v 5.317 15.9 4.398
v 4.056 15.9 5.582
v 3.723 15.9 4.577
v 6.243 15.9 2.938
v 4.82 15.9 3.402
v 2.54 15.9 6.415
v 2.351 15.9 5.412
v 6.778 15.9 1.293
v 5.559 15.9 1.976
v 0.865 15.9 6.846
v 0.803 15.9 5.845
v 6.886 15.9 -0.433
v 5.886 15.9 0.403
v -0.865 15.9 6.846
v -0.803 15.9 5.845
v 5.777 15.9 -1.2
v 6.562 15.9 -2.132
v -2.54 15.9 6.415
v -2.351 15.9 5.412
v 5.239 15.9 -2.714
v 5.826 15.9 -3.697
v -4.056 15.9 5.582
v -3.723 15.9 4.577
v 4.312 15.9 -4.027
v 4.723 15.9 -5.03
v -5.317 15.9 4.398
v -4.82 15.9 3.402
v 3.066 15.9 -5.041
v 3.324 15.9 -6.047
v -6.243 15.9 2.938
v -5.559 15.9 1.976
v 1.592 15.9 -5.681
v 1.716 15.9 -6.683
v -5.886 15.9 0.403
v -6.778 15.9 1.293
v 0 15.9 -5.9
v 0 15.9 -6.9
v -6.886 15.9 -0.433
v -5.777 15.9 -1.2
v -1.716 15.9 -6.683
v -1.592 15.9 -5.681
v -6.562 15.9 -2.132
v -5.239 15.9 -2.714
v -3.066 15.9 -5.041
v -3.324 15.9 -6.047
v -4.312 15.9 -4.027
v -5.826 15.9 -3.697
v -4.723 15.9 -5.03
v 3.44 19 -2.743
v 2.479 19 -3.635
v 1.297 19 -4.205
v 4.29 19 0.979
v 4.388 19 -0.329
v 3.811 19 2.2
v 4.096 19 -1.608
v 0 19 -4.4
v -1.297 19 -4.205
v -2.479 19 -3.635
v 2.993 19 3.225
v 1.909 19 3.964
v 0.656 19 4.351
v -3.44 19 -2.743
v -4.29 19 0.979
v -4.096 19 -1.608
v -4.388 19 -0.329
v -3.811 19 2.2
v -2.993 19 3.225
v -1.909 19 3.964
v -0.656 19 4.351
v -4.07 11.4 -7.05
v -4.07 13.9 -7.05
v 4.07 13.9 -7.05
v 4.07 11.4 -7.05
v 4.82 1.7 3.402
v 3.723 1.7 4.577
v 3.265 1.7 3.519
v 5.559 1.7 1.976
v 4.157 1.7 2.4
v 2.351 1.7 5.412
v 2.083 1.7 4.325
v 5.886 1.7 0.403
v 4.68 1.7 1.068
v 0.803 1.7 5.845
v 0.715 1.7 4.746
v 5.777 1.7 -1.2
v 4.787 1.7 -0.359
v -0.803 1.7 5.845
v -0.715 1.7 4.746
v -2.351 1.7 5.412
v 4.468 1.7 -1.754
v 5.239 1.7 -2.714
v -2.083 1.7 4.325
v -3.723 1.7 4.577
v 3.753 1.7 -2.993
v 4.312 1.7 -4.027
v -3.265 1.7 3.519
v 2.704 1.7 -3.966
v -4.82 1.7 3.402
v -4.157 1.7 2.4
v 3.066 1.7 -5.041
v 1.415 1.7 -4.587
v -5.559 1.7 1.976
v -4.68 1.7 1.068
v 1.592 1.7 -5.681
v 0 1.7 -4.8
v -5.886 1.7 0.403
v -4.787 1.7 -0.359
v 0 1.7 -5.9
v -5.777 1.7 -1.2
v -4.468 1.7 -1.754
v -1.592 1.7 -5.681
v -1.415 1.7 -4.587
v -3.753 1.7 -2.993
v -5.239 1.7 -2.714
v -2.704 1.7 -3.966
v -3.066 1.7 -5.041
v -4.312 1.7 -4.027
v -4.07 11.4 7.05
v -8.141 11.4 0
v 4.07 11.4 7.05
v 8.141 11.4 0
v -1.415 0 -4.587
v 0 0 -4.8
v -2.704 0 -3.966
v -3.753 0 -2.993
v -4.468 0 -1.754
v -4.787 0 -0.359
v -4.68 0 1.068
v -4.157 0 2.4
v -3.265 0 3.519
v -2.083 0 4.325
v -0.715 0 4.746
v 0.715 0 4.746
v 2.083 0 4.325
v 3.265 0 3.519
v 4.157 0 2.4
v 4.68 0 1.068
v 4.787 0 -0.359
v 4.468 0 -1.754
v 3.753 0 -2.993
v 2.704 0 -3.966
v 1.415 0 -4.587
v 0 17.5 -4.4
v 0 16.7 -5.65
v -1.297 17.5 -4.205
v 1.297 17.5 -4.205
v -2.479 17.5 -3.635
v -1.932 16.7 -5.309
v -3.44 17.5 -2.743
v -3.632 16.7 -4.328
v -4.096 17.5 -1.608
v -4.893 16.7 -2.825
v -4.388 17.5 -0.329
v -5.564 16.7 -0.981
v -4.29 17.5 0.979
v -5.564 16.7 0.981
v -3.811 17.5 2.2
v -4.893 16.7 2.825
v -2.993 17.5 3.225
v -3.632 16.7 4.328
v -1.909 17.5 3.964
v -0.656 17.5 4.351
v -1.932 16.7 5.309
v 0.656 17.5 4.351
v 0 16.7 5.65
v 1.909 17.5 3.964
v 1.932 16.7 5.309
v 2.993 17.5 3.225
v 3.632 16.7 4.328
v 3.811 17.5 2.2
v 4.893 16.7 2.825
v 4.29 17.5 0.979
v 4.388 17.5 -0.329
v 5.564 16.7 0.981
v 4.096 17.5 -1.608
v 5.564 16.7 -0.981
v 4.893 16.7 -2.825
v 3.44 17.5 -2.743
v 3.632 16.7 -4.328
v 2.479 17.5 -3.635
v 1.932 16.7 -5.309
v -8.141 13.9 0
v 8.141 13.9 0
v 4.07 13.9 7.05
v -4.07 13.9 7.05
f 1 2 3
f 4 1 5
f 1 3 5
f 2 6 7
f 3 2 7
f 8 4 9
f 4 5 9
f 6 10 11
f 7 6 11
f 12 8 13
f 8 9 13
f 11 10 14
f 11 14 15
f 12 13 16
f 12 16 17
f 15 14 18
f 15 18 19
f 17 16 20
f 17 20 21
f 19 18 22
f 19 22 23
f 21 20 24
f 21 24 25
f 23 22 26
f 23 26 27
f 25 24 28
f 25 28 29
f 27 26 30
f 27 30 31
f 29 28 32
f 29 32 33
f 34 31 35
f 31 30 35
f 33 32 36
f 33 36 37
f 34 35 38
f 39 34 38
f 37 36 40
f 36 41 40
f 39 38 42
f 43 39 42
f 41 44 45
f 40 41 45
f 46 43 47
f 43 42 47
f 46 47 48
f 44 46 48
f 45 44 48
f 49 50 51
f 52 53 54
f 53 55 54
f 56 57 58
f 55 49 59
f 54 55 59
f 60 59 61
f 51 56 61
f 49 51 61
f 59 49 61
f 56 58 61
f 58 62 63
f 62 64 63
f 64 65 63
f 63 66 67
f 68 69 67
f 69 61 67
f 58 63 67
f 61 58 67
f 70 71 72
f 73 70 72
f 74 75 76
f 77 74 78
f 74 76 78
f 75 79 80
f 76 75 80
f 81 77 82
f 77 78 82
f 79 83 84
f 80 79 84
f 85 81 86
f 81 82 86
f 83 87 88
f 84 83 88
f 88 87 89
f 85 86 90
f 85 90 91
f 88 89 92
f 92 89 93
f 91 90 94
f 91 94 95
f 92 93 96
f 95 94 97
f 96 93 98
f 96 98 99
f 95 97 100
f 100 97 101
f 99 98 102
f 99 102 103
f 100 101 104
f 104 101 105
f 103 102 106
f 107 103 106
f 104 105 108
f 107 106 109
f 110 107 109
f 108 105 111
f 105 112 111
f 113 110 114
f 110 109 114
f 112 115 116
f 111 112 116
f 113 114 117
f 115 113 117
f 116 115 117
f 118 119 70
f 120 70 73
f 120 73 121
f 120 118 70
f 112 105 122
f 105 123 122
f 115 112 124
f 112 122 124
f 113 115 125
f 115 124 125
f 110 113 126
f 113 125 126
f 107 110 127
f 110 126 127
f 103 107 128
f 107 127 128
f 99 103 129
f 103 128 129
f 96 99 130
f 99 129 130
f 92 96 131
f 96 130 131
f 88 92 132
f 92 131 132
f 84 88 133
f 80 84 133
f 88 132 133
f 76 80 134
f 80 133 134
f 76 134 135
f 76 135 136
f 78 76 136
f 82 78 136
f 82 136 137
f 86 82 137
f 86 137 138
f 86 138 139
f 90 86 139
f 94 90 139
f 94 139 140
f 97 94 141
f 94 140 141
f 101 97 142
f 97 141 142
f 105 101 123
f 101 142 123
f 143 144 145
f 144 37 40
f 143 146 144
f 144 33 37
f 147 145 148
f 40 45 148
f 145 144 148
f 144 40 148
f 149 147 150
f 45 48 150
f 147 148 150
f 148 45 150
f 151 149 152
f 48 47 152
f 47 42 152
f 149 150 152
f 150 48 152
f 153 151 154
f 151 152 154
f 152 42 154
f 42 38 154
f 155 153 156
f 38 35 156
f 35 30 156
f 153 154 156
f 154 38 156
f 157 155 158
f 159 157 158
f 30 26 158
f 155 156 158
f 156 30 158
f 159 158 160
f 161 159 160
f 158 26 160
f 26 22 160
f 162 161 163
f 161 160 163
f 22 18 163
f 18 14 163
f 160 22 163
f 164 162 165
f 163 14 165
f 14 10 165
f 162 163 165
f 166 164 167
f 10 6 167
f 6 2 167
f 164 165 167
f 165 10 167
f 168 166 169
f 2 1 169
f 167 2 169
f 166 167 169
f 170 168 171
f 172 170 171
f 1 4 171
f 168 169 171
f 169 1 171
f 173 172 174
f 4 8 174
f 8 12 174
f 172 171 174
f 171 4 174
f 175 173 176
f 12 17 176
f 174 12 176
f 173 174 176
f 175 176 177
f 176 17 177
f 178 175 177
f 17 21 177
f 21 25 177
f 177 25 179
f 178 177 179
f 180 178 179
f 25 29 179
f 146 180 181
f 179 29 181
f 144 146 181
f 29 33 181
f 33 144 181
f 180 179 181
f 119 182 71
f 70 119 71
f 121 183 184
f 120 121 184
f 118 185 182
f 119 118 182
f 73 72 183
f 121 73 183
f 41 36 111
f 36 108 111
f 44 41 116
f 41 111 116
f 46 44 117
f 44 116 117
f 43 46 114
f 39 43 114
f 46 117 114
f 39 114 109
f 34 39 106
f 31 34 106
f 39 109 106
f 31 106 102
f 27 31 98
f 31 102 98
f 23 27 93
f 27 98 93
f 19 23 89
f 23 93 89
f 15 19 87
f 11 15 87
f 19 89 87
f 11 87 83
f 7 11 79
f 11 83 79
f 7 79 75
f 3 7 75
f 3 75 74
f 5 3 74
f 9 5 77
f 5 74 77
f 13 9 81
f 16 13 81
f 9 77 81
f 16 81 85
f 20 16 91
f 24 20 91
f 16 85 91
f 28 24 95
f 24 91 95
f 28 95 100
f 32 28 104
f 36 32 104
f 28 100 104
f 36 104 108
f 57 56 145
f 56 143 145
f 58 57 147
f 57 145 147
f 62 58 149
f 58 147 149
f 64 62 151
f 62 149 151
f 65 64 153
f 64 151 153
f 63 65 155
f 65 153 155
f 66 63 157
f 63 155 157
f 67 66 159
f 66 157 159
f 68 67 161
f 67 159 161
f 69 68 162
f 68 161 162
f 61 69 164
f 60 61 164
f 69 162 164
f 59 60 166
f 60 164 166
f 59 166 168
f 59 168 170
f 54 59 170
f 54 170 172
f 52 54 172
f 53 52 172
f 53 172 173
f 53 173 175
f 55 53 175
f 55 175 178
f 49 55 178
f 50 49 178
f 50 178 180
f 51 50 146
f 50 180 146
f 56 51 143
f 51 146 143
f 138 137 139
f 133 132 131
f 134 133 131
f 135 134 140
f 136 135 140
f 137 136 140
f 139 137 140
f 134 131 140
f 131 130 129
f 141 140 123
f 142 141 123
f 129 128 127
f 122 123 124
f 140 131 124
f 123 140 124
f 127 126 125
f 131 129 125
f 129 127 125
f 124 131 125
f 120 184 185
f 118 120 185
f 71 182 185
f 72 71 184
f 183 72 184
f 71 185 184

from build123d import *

# Parameters (mm, degrees)
BOSS_EXTRUDE1_DEPTH = 2.5


with BuildPart() as part:
    # Sketch1 → Revolve1 (revolve)
    with BuildSketch(Plane(origin=(0, 0, 0), x_dir=(0, 0, -1), z_dir=(1, 0, 0))):
        Polygon((0, 0), (0, 19), (4.4, 19), (4.4, 17.5), (6.9, 15.9), (5.9, 15.9), (5.9, 1.7), (4.8, 1.7), (4.8, 0), align=None)
    revolve(axis=Axis((0, 0, 0), (0, 1, 0)))


with BuildPart() as body_2:
    # Sketch2 → Boss-Extrude1 (new body)
    with BuildSketch(Plane.XZ.offset(-13.9)):
        Polygon((-4.070319398, -7.05), (4.070319398, -7.05), (8.140638796, 0), (4.070319398, 7.05), (-4.070319398, 7.05), (-8.140638796, 0), align=None)
    extrude(amount=BOSS_EXTRUDE1_DEPTH)


solid = Compound([part.part, body_2.part])
